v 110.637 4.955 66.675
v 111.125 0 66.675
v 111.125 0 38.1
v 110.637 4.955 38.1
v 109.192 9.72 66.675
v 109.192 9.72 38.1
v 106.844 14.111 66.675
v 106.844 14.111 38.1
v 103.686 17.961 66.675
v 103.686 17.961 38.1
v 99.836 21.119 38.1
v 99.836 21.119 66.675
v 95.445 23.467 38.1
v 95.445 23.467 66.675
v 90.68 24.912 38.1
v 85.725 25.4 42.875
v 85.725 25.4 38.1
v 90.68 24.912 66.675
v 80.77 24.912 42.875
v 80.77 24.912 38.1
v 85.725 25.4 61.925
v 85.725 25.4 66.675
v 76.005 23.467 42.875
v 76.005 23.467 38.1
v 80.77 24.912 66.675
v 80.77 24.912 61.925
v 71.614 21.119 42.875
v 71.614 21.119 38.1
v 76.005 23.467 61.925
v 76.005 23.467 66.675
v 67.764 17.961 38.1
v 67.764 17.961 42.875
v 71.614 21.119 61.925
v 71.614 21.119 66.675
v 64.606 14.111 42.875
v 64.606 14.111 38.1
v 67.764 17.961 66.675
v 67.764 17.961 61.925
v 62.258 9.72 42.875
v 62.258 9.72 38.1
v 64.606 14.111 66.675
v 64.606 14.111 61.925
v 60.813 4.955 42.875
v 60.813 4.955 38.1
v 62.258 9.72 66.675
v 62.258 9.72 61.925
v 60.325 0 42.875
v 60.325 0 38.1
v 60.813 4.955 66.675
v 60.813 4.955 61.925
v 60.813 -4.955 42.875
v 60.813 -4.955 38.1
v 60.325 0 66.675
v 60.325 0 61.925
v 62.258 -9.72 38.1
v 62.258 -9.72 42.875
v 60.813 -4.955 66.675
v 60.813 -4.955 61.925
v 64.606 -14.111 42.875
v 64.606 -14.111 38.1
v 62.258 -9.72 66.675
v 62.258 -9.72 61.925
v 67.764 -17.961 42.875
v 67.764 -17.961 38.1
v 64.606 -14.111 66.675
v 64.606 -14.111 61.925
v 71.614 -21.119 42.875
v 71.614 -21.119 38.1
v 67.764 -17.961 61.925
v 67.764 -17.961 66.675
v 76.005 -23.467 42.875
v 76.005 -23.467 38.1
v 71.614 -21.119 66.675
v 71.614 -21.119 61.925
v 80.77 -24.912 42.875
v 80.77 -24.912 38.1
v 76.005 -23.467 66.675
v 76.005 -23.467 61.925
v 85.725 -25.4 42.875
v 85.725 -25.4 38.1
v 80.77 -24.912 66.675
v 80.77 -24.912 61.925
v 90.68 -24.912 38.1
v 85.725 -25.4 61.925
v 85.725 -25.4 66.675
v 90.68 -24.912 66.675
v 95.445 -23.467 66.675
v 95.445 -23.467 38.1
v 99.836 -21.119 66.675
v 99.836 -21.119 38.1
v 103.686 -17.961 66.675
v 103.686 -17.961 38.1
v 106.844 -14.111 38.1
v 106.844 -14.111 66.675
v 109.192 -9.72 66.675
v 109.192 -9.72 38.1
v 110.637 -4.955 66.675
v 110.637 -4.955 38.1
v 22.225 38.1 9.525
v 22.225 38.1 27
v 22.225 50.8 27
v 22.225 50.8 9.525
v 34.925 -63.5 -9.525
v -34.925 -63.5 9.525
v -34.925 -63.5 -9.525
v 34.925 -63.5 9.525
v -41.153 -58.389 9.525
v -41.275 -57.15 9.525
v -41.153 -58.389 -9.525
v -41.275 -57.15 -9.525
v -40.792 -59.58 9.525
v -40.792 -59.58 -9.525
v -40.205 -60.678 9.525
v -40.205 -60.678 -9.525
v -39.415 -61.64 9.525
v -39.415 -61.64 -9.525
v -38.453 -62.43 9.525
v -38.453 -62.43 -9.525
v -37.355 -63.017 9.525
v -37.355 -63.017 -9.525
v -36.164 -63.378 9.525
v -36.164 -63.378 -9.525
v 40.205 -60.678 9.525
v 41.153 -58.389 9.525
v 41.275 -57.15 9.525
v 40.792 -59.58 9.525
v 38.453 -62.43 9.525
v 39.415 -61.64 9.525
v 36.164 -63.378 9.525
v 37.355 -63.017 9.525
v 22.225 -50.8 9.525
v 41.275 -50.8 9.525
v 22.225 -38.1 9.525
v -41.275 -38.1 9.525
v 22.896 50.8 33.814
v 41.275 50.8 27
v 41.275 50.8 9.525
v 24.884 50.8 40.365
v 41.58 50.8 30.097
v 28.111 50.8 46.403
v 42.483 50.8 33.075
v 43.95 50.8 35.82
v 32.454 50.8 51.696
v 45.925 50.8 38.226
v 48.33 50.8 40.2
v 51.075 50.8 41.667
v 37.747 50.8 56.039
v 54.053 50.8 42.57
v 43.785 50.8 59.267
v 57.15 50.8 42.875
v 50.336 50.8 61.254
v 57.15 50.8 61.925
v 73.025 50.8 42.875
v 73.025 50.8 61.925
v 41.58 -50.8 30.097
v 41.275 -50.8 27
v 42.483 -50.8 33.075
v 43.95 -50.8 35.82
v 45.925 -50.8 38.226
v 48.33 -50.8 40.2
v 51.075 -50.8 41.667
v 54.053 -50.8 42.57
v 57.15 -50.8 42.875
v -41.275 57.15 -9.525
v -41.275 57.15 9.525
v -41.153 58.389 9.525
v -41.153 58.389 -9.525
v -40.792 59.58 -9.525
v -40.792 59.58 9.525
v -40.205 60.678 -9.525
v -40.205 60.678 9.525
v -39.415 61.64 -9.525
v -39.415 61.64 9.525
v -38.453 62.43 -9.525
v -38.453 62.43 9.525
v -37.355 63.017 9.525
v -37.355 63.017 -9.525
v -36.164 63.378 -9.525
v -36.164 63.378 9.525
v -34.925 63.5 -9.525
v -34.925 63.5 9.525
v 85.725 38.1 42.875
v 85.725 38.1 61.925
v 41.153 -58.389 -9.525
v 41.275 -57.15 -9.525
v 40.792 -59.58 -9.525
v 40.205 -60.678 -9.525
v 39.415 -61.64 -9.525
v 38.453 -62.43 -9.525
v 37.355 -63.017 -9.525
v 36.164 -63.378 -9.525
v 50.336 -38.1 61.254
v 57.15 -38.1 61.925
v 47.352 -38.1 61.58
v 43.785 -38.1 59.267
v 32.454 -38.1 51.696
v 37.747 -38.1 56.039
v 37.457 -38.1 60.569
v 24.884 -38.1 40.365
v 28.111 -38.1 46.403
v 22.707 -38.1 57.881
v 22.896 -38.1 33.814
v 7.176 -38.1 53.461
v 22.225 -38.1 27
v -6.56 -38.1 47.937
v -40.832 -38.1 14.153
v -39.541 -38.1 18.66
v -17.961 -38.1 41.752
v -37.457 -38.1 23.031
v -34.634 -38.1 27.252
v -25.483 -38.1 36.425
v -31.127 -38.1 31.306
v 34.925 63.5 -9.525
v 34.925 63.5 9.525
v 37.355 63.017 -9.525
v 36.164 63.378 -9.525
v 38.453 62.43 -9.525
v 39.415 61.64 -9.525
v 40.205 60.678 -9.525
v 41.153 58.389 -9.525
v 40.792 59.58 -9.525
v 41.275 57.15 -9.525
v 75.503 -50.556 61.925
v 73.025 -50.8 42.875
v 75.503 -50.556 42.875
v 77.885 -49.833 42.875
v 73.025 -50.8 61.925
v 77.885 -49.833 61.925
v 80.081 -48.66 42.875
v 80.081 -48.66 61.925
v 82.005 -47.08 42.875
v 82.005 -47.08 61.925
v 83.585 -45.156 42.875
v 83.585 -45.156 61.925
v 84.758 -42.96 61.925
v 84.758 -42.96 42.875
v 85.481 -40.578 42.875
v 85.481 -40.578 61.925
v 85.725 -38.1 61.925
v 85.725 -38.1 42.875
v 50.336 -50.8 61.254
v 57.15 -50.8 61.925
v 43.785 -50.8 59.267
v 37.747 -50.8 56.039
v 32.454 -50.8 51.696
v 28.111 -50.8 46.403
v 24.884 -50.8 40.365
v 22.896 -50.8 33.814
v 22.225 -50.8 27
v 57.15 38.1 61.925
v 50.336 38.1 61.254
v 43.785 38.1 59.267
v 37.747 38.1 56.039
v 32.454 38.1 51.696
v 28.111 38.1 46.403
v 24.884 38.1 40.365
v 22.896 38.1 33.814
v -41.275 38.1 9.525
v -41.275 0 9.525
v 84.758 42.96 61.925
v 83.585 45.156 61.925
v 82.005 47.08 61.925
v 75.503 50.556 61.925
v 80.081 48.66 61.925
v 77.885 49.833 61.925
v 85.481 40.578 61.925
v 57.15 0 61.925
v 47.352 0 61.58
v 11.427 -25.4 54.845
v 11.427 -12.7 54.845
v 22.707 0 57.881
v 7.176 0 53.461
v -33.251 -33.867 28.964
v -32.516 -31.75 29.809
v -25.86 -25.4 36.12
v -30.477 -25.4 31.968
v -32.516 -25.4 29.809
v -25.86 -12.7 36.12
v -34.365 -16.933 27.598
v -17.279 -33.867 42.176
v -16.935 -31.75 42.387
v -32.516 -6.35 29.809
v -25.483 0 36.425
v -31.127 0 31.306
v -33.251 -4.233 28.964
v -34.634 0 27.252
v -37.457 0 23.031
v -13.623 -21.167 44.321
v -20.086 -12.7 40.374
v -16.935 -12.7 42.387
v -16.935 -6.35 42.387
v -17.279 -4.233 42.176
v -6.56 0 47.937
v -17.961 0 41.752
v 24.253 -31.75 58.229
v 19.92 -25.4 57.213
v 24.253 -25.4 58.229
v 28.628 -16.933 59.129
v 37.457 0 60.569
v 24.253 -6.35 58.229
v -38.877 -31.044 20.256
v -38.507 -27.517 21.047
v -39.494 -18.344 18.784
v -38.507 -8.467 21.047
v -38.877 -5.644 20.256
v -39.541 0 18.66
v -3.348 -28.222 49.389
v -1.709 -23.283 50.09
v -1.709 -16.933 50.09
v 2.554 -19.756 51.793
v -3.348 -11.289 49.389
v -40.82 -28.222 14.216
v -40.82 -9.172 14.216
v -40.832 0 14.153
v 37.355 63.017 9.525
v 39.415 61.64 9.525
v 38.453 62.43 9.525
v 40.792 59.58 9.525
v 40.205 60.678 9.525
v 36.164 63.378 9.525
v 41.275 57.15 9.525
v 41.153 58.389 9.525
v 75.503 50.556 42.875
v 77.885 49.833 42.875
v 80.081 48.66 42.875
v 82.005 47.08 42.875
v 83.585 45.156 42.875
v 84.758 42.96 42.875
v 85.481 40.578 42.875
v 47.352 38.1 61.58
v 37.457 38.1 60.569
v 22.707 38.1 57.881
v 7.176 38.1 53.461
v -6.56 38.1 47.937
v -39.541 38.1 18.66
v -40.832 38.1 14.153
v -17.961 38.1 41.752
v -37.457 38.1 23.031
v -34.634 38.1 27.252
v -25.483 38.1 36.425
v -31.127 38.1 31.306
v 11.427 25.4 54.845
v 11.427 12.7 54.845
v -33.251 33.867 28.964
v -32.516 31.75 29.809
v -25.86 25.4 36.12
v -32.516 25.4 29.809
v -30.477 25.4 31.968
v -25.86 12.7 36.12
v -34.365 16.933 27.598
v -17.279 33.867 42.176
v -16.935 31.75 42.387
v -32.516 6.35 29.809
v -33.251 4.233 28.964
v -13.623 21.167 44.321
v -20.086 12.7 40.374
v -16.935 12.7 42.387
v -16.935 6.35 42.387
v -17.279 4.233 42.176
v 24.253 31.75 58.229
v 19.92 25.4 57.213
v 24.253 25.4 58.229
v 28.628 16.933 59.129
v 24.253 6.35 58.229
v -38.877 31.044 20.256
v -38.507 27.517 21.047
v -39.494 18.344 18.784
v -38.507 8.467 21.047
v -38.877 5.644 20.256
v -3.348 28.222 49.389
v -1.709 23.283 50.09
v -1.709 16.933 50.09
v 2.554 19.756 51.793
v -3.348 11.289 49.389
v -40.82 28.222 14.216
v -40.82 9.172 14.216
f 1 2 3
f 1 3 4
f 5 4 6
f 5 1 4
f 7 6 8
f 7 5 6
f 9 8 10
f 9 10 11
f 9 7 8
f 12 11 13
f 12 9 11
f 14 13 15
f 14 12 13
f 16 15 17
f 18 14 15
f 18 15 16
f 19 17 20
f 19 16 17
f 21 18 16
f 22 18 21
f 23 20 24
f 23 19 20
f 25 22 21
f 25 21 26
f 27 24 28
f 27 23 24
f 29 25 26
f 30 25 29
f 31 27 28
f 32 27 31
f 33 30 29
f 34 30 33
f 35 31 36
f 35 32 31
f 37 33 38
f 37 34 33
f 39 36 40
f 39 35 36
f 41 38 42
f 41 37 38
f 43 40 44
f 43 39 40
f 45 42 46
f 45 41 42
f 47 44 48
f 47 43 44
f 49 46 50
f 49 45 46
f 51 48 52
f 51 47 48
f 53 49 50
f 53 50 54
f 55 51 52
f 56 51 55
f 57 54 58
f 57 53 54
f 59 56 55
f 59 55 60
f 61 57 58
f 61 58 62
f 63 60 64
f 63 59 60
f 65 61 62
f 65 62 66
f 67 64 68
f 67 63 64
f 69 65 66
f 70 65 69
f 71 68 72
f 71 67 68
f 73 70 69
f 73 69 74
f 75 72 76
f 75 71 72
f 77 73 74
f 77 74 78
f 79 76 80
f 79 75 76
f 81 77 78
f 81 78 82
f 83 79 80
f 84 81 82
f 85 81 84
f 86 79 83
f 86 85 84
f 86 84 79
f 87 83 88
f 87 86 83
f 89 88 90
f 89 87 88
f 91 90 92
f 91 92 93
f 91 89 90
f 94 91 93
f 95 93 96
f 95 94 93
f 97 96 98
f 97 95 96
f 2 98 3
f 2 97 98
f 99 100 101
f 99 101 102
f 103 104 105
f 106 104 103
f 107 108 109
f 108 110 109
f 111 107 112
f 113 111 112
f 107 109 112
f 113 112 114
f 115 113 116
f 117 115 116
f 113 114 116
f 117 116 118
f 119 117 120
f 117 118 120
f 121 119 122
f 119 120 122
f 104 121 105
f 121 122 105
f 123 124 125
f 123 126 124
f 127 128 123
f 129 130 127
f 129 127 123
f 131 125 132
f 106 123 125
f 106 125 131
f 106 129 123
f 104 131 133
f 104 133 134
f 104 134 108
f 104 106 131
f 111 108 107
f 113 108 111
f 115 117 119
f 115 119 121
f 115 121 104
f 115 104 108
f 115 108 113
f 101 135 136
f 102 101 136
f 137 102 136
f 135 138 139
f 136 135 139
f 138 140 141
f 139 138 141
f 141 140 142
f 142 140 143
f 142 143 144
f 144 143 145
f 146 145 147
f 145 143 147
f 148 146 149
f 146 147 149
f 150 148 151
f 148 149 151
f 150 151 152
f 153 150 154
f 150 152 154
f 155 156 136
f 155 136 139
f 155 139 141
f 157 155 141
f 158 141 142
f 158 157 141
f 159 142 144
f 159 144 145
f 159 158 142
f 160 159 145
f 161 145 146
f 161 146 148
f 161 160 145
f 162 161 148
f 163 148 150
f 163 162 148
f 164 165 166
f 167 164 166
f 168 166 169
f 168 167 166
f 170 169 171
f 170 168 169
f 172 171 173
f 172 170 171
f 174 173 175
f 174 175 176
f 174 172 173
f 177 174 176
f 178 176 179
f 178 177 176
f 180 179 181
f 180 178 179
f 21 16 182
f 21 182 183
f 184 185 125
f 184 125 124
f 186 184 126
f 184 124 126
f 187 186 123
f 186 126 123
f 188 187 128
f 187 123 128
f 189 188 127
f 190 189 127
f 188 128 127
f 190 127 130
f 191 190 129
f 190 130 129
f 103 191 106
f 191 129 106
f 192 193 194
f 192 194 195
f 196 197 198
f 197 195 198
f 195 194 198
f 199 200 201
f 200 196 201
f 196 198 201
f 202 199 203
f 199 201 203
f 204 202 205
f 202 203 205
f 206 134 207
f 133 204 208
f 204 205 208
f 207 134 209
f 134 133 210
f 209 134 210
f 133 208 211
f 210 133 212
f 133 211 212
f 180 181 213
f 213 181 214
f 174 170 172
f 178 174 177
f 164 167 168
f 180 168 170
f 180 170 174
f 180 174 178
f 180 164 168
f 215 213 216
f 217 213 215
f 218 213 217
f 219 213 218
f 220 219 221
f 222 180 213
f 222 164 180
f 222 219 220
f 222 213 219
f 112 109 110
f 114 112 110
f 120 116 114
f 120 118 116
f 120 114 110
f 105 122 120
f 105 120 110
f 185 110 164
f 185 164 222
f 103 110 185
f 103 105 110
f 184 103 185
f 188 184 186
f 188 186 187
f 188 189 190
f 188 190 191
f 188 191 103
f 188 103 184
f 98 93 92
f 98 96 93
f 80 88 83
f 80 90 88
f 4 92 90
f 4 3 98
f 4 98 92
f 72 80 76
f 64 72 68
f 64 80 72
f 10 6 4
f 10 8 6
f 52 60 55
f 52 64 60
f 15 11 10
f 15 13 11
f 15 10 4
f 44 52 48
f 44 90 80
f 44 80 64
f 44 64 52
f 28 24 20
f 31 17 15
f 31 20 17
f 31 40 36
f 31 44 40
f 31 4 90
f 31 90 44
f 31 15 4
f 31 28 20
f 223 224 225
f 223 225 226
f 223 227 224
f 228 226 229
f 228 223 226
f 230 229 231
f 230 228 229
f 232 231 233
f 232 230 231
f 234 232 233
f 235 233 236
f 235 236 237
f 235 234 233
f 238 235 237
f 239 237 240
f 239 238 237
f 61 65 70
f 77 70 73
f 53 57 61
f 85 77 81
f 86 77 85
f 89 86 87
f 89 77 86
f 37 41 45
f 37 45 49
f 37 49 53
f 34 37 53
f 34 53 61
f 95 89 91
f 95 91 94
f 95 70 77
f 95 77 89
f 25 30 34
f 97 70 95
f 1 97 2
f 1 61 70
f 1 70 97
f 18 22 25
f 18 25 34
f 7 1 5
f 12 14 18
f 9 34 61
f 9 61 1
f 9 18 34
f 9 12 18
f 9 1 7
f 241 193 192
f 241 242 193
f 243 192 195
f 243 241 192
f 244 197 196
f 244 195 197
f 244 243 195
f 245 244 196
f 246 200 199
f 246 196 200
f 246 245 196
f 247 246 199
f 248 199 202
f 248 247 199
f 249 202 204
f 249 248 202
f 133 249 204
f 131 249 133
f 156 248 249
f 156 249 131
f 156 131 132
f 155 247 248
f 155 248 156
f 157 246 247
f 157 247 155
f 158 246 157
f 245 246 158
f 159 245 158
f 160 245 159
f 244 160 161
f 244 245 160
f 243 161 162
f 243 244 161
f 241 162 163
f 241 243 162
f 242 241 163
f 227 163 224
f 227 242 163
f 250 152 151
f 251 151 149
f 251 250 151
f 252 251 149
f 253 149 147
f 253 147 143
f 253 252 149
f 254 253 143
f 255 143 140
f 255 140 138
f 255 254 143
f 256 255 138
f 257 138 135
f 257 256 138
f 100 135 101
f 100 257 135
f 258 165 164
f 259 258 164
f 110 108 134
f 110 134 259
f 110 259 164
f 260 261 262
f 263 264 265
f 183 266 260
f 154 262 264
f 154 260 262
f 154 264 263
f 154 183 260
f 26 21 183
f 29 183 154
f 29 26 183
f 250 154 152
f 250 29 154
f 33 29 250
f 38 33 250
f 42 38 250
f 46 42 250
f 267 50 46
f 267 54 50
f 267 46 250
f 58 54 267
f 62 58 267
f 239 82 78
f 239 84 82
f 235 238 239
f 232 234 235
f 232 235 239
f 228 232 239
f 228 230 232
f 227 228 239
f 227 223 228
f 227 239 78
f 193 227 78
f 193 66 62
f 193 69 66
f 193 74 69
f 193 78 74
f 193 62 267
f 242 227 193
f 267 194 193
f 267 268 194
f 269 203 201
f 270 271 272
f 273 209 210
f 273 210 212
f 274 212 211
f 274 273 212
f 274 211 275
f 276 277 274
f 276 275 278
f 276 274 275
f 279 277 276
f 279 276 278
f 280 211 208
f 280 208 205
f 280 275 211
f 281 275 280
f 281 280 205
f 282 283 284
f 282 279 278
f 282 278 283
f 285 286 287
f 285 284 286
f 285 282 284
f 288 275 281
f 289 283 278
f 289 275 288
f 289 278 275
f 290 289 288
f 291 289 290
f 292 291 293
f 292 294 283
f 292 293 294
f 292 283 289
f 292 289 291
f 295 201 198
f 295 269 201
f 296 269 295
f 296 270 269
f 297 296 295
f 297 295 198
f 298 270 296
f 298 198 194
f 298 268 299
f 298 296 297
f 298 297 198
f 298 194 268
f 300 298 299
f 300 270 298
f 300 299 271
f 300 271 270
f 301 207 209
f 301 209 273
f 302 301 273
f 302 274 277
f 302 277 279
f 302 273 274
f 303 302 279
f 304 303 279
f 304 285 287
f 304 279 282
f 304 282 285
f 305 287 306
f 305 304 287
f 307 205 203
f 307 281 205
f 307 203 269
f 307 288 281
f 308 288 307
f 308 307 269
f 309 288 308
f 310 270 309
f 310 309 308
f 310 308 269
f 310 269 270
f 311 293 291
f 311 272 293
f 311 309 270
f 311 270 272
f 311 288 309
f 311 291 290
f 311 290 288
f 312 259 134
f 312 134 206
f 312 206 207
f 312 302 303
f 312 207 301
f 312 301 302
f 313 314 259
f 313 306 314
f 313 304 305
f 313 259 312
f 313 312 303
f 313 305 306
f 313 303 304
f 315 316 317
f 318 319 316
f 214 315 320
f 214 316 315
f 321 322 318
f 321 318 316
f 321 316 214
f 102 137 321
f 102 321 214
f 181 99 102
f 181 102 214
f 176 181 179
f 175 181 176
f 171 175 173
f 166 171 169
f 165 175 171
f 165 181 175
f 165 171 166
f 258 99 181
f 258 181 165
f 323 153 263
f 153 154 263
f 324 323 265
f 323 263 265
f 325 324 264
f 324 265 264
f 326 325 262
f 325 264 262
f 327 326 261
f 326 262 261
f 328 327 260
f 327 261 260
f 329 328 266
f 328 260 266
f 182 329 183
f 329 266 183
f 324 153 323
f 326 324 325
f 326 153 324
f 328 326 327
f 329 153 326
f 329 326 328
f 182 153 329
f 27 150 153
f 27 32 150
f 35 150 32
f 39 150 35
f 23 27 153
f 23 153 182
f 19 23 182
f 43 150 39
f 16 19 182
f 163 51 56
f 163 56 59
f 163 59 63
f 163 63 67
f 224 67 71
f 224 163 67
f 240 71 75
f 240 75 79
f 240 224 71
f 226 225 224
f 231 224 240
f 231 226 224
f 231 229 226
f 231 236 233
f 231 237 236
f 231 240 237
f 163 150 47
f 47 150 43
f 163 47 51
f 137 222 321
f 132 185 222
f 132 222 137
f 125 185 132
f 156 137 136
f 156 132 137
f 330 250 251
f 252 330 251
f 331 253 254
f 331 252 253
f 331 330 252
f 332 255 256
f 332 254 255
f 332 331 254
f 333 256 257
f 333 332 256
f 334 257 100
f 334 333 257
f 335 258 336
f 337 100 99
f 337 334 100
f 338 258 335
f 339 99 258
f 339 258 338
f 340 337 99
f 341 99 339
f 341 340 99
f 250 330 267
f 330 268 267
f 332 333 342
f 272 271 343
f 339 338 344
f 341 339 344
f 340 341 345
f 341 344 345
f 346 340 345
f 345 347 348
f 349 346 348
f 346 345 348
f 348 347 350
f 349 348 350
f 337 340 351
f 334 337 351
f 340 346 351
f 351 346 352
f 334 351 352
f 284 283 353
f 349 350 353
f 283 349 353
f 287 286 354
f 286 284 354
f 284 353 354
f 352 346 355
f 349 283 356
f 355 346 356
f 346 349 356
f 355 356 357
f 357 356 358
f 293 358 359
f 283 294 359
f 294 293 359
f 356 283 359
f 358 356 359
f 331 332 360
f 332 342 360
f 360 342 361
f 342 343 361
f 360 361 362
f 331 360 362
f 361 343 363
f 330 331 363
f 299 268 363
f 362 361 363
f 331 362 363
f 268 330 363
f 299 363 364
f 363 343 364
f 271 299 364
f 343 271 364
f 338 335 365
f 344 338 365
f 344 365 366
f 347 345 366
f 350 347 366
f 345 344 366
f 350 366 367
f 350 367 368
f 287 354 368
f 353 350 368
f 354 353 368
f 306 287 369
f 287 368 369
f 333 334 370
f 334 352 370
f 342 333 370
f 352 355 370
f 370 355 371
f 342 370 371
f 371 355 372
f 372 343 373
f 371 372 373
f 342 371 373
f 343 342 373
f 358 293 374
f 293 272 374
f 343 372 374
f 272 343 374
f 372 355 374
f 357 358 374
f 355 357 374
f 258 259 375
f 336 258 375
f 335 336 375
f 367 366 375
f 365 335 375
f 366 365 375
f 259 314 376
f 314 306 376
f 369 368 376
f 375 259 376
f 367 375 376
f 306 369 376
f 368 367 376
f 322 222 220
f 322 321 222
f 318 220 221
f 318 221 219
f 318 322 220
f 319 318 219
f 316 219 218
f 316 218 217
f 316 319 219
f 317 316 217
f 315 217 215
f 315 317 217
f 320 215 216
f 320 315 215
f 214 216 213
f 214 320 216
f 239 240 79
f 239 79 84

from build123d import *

# Parameters (mm, degrees)
F1_DEPTH = 63.5
F0_W     = 25.4
F0_H     = 19.05
F2_DEPTH = 50.8
F3_DEPTH = 38.1
F5_R     = 6.35
F6_R     = 12.7


with BuildPart() as f1:
    # F0 (on Front) → F1 (new body, symmetric)
    with BuildSketch(Plane.XZ):
        Polygon((22.225, 9.525), (-41.275, 9.525), (-41.275, -9.525), (41.275, -9.525), (41.275, 9.525), align=None)
    extrude(amount=F1_DEPTH, both=True)

    # F0 (on Front) → F2 (join, symmetric)
    with BuildSketch(Plane.XZ):
        with BuildLine():
            Line((22.225, 27.0002), (22.225, 9.525))
            Line((22.225, 9.525), (41.275, 9.525))
            Line((41.275, 9.525), (41.275, 27.0002))
            ThreePointArc((41.275, 27.0002), (45.9246798487, 38.2255201513), (57.15, 42.8752))
            Line((57.15, 42.8752), (60.325, 42.8752))
            Line((60.325, 42.8752), (60.325, 61.9252))
            Line((60.325, 61.9252), (57.15, 61.9252))
            ThreePointArc((57.15, 61.9252), (32.4542956671, 51.6959043329), (22.225, 27.0002))
        make_face()
        with Locations((73.025, 52.4002)):
            Rectangle(F0_W, F0_H)
    extrude(amount=F2_DEPTH, both=True)

    # F0 (on Front) → F3 (join, symmetric)
    with BuildSketch(Plane.XZ):
        with BuildLine():
            add(Edge.make_bspline(
                [(-41.275, 9.525), (-41.275, 38.7971624732), (11.6867609322, 61.9252), (57.15, 61.9252)],
                knots=[0, 0, 0, 0, 111.5045361635, 111.5045361635, 111.5045361635, 111.5045361635], degree=3))
            Line((-41.275, 9.525), (22.225, 9.525))
            Line((22.225, 9.525), (22.225, 27.0002))
            ThreePointArc((22.225, 27.0002), (32.4542956671, 51.6959043329), (57.15, 61.9252))
        make_face()
    extrude(amount=F3_DEPTH, both=True)

    # F0 (on Front) → F4 (revolve)
    with BuildSketch(Plane.XZ):
        Polygon((85.725, 66.675), (85.725, 61.9252), (85.725, 42.8752), (85.725, 38.1), (111.125, 38.1), (111.125, 66.675), align=None)
    revolve(axis=Axis((85.725, 0, 52.3875), (0, 0, 1)))

    # F5
    f5_edges = [f1.edges().sort_by_distance(p)[0] for p in [
        (41.275, -63.5, 0),
        (41.275, 63.5, 0),
        (-41.275, 63.5, 0),
        (-41.275, -63.5, 0),
    ]]
    fillet(f5_edges, radius=F5_R)

    # F6
    f6_edges = [f1.edges().sort_by_distance(p)[0] for p in [
        (85.725, -50.8, 52.4002),
        (85.725, 50.8, 52.4002),
    ]]
    fillet(f6_edges, radius=F6_R)


solid = f1.part
